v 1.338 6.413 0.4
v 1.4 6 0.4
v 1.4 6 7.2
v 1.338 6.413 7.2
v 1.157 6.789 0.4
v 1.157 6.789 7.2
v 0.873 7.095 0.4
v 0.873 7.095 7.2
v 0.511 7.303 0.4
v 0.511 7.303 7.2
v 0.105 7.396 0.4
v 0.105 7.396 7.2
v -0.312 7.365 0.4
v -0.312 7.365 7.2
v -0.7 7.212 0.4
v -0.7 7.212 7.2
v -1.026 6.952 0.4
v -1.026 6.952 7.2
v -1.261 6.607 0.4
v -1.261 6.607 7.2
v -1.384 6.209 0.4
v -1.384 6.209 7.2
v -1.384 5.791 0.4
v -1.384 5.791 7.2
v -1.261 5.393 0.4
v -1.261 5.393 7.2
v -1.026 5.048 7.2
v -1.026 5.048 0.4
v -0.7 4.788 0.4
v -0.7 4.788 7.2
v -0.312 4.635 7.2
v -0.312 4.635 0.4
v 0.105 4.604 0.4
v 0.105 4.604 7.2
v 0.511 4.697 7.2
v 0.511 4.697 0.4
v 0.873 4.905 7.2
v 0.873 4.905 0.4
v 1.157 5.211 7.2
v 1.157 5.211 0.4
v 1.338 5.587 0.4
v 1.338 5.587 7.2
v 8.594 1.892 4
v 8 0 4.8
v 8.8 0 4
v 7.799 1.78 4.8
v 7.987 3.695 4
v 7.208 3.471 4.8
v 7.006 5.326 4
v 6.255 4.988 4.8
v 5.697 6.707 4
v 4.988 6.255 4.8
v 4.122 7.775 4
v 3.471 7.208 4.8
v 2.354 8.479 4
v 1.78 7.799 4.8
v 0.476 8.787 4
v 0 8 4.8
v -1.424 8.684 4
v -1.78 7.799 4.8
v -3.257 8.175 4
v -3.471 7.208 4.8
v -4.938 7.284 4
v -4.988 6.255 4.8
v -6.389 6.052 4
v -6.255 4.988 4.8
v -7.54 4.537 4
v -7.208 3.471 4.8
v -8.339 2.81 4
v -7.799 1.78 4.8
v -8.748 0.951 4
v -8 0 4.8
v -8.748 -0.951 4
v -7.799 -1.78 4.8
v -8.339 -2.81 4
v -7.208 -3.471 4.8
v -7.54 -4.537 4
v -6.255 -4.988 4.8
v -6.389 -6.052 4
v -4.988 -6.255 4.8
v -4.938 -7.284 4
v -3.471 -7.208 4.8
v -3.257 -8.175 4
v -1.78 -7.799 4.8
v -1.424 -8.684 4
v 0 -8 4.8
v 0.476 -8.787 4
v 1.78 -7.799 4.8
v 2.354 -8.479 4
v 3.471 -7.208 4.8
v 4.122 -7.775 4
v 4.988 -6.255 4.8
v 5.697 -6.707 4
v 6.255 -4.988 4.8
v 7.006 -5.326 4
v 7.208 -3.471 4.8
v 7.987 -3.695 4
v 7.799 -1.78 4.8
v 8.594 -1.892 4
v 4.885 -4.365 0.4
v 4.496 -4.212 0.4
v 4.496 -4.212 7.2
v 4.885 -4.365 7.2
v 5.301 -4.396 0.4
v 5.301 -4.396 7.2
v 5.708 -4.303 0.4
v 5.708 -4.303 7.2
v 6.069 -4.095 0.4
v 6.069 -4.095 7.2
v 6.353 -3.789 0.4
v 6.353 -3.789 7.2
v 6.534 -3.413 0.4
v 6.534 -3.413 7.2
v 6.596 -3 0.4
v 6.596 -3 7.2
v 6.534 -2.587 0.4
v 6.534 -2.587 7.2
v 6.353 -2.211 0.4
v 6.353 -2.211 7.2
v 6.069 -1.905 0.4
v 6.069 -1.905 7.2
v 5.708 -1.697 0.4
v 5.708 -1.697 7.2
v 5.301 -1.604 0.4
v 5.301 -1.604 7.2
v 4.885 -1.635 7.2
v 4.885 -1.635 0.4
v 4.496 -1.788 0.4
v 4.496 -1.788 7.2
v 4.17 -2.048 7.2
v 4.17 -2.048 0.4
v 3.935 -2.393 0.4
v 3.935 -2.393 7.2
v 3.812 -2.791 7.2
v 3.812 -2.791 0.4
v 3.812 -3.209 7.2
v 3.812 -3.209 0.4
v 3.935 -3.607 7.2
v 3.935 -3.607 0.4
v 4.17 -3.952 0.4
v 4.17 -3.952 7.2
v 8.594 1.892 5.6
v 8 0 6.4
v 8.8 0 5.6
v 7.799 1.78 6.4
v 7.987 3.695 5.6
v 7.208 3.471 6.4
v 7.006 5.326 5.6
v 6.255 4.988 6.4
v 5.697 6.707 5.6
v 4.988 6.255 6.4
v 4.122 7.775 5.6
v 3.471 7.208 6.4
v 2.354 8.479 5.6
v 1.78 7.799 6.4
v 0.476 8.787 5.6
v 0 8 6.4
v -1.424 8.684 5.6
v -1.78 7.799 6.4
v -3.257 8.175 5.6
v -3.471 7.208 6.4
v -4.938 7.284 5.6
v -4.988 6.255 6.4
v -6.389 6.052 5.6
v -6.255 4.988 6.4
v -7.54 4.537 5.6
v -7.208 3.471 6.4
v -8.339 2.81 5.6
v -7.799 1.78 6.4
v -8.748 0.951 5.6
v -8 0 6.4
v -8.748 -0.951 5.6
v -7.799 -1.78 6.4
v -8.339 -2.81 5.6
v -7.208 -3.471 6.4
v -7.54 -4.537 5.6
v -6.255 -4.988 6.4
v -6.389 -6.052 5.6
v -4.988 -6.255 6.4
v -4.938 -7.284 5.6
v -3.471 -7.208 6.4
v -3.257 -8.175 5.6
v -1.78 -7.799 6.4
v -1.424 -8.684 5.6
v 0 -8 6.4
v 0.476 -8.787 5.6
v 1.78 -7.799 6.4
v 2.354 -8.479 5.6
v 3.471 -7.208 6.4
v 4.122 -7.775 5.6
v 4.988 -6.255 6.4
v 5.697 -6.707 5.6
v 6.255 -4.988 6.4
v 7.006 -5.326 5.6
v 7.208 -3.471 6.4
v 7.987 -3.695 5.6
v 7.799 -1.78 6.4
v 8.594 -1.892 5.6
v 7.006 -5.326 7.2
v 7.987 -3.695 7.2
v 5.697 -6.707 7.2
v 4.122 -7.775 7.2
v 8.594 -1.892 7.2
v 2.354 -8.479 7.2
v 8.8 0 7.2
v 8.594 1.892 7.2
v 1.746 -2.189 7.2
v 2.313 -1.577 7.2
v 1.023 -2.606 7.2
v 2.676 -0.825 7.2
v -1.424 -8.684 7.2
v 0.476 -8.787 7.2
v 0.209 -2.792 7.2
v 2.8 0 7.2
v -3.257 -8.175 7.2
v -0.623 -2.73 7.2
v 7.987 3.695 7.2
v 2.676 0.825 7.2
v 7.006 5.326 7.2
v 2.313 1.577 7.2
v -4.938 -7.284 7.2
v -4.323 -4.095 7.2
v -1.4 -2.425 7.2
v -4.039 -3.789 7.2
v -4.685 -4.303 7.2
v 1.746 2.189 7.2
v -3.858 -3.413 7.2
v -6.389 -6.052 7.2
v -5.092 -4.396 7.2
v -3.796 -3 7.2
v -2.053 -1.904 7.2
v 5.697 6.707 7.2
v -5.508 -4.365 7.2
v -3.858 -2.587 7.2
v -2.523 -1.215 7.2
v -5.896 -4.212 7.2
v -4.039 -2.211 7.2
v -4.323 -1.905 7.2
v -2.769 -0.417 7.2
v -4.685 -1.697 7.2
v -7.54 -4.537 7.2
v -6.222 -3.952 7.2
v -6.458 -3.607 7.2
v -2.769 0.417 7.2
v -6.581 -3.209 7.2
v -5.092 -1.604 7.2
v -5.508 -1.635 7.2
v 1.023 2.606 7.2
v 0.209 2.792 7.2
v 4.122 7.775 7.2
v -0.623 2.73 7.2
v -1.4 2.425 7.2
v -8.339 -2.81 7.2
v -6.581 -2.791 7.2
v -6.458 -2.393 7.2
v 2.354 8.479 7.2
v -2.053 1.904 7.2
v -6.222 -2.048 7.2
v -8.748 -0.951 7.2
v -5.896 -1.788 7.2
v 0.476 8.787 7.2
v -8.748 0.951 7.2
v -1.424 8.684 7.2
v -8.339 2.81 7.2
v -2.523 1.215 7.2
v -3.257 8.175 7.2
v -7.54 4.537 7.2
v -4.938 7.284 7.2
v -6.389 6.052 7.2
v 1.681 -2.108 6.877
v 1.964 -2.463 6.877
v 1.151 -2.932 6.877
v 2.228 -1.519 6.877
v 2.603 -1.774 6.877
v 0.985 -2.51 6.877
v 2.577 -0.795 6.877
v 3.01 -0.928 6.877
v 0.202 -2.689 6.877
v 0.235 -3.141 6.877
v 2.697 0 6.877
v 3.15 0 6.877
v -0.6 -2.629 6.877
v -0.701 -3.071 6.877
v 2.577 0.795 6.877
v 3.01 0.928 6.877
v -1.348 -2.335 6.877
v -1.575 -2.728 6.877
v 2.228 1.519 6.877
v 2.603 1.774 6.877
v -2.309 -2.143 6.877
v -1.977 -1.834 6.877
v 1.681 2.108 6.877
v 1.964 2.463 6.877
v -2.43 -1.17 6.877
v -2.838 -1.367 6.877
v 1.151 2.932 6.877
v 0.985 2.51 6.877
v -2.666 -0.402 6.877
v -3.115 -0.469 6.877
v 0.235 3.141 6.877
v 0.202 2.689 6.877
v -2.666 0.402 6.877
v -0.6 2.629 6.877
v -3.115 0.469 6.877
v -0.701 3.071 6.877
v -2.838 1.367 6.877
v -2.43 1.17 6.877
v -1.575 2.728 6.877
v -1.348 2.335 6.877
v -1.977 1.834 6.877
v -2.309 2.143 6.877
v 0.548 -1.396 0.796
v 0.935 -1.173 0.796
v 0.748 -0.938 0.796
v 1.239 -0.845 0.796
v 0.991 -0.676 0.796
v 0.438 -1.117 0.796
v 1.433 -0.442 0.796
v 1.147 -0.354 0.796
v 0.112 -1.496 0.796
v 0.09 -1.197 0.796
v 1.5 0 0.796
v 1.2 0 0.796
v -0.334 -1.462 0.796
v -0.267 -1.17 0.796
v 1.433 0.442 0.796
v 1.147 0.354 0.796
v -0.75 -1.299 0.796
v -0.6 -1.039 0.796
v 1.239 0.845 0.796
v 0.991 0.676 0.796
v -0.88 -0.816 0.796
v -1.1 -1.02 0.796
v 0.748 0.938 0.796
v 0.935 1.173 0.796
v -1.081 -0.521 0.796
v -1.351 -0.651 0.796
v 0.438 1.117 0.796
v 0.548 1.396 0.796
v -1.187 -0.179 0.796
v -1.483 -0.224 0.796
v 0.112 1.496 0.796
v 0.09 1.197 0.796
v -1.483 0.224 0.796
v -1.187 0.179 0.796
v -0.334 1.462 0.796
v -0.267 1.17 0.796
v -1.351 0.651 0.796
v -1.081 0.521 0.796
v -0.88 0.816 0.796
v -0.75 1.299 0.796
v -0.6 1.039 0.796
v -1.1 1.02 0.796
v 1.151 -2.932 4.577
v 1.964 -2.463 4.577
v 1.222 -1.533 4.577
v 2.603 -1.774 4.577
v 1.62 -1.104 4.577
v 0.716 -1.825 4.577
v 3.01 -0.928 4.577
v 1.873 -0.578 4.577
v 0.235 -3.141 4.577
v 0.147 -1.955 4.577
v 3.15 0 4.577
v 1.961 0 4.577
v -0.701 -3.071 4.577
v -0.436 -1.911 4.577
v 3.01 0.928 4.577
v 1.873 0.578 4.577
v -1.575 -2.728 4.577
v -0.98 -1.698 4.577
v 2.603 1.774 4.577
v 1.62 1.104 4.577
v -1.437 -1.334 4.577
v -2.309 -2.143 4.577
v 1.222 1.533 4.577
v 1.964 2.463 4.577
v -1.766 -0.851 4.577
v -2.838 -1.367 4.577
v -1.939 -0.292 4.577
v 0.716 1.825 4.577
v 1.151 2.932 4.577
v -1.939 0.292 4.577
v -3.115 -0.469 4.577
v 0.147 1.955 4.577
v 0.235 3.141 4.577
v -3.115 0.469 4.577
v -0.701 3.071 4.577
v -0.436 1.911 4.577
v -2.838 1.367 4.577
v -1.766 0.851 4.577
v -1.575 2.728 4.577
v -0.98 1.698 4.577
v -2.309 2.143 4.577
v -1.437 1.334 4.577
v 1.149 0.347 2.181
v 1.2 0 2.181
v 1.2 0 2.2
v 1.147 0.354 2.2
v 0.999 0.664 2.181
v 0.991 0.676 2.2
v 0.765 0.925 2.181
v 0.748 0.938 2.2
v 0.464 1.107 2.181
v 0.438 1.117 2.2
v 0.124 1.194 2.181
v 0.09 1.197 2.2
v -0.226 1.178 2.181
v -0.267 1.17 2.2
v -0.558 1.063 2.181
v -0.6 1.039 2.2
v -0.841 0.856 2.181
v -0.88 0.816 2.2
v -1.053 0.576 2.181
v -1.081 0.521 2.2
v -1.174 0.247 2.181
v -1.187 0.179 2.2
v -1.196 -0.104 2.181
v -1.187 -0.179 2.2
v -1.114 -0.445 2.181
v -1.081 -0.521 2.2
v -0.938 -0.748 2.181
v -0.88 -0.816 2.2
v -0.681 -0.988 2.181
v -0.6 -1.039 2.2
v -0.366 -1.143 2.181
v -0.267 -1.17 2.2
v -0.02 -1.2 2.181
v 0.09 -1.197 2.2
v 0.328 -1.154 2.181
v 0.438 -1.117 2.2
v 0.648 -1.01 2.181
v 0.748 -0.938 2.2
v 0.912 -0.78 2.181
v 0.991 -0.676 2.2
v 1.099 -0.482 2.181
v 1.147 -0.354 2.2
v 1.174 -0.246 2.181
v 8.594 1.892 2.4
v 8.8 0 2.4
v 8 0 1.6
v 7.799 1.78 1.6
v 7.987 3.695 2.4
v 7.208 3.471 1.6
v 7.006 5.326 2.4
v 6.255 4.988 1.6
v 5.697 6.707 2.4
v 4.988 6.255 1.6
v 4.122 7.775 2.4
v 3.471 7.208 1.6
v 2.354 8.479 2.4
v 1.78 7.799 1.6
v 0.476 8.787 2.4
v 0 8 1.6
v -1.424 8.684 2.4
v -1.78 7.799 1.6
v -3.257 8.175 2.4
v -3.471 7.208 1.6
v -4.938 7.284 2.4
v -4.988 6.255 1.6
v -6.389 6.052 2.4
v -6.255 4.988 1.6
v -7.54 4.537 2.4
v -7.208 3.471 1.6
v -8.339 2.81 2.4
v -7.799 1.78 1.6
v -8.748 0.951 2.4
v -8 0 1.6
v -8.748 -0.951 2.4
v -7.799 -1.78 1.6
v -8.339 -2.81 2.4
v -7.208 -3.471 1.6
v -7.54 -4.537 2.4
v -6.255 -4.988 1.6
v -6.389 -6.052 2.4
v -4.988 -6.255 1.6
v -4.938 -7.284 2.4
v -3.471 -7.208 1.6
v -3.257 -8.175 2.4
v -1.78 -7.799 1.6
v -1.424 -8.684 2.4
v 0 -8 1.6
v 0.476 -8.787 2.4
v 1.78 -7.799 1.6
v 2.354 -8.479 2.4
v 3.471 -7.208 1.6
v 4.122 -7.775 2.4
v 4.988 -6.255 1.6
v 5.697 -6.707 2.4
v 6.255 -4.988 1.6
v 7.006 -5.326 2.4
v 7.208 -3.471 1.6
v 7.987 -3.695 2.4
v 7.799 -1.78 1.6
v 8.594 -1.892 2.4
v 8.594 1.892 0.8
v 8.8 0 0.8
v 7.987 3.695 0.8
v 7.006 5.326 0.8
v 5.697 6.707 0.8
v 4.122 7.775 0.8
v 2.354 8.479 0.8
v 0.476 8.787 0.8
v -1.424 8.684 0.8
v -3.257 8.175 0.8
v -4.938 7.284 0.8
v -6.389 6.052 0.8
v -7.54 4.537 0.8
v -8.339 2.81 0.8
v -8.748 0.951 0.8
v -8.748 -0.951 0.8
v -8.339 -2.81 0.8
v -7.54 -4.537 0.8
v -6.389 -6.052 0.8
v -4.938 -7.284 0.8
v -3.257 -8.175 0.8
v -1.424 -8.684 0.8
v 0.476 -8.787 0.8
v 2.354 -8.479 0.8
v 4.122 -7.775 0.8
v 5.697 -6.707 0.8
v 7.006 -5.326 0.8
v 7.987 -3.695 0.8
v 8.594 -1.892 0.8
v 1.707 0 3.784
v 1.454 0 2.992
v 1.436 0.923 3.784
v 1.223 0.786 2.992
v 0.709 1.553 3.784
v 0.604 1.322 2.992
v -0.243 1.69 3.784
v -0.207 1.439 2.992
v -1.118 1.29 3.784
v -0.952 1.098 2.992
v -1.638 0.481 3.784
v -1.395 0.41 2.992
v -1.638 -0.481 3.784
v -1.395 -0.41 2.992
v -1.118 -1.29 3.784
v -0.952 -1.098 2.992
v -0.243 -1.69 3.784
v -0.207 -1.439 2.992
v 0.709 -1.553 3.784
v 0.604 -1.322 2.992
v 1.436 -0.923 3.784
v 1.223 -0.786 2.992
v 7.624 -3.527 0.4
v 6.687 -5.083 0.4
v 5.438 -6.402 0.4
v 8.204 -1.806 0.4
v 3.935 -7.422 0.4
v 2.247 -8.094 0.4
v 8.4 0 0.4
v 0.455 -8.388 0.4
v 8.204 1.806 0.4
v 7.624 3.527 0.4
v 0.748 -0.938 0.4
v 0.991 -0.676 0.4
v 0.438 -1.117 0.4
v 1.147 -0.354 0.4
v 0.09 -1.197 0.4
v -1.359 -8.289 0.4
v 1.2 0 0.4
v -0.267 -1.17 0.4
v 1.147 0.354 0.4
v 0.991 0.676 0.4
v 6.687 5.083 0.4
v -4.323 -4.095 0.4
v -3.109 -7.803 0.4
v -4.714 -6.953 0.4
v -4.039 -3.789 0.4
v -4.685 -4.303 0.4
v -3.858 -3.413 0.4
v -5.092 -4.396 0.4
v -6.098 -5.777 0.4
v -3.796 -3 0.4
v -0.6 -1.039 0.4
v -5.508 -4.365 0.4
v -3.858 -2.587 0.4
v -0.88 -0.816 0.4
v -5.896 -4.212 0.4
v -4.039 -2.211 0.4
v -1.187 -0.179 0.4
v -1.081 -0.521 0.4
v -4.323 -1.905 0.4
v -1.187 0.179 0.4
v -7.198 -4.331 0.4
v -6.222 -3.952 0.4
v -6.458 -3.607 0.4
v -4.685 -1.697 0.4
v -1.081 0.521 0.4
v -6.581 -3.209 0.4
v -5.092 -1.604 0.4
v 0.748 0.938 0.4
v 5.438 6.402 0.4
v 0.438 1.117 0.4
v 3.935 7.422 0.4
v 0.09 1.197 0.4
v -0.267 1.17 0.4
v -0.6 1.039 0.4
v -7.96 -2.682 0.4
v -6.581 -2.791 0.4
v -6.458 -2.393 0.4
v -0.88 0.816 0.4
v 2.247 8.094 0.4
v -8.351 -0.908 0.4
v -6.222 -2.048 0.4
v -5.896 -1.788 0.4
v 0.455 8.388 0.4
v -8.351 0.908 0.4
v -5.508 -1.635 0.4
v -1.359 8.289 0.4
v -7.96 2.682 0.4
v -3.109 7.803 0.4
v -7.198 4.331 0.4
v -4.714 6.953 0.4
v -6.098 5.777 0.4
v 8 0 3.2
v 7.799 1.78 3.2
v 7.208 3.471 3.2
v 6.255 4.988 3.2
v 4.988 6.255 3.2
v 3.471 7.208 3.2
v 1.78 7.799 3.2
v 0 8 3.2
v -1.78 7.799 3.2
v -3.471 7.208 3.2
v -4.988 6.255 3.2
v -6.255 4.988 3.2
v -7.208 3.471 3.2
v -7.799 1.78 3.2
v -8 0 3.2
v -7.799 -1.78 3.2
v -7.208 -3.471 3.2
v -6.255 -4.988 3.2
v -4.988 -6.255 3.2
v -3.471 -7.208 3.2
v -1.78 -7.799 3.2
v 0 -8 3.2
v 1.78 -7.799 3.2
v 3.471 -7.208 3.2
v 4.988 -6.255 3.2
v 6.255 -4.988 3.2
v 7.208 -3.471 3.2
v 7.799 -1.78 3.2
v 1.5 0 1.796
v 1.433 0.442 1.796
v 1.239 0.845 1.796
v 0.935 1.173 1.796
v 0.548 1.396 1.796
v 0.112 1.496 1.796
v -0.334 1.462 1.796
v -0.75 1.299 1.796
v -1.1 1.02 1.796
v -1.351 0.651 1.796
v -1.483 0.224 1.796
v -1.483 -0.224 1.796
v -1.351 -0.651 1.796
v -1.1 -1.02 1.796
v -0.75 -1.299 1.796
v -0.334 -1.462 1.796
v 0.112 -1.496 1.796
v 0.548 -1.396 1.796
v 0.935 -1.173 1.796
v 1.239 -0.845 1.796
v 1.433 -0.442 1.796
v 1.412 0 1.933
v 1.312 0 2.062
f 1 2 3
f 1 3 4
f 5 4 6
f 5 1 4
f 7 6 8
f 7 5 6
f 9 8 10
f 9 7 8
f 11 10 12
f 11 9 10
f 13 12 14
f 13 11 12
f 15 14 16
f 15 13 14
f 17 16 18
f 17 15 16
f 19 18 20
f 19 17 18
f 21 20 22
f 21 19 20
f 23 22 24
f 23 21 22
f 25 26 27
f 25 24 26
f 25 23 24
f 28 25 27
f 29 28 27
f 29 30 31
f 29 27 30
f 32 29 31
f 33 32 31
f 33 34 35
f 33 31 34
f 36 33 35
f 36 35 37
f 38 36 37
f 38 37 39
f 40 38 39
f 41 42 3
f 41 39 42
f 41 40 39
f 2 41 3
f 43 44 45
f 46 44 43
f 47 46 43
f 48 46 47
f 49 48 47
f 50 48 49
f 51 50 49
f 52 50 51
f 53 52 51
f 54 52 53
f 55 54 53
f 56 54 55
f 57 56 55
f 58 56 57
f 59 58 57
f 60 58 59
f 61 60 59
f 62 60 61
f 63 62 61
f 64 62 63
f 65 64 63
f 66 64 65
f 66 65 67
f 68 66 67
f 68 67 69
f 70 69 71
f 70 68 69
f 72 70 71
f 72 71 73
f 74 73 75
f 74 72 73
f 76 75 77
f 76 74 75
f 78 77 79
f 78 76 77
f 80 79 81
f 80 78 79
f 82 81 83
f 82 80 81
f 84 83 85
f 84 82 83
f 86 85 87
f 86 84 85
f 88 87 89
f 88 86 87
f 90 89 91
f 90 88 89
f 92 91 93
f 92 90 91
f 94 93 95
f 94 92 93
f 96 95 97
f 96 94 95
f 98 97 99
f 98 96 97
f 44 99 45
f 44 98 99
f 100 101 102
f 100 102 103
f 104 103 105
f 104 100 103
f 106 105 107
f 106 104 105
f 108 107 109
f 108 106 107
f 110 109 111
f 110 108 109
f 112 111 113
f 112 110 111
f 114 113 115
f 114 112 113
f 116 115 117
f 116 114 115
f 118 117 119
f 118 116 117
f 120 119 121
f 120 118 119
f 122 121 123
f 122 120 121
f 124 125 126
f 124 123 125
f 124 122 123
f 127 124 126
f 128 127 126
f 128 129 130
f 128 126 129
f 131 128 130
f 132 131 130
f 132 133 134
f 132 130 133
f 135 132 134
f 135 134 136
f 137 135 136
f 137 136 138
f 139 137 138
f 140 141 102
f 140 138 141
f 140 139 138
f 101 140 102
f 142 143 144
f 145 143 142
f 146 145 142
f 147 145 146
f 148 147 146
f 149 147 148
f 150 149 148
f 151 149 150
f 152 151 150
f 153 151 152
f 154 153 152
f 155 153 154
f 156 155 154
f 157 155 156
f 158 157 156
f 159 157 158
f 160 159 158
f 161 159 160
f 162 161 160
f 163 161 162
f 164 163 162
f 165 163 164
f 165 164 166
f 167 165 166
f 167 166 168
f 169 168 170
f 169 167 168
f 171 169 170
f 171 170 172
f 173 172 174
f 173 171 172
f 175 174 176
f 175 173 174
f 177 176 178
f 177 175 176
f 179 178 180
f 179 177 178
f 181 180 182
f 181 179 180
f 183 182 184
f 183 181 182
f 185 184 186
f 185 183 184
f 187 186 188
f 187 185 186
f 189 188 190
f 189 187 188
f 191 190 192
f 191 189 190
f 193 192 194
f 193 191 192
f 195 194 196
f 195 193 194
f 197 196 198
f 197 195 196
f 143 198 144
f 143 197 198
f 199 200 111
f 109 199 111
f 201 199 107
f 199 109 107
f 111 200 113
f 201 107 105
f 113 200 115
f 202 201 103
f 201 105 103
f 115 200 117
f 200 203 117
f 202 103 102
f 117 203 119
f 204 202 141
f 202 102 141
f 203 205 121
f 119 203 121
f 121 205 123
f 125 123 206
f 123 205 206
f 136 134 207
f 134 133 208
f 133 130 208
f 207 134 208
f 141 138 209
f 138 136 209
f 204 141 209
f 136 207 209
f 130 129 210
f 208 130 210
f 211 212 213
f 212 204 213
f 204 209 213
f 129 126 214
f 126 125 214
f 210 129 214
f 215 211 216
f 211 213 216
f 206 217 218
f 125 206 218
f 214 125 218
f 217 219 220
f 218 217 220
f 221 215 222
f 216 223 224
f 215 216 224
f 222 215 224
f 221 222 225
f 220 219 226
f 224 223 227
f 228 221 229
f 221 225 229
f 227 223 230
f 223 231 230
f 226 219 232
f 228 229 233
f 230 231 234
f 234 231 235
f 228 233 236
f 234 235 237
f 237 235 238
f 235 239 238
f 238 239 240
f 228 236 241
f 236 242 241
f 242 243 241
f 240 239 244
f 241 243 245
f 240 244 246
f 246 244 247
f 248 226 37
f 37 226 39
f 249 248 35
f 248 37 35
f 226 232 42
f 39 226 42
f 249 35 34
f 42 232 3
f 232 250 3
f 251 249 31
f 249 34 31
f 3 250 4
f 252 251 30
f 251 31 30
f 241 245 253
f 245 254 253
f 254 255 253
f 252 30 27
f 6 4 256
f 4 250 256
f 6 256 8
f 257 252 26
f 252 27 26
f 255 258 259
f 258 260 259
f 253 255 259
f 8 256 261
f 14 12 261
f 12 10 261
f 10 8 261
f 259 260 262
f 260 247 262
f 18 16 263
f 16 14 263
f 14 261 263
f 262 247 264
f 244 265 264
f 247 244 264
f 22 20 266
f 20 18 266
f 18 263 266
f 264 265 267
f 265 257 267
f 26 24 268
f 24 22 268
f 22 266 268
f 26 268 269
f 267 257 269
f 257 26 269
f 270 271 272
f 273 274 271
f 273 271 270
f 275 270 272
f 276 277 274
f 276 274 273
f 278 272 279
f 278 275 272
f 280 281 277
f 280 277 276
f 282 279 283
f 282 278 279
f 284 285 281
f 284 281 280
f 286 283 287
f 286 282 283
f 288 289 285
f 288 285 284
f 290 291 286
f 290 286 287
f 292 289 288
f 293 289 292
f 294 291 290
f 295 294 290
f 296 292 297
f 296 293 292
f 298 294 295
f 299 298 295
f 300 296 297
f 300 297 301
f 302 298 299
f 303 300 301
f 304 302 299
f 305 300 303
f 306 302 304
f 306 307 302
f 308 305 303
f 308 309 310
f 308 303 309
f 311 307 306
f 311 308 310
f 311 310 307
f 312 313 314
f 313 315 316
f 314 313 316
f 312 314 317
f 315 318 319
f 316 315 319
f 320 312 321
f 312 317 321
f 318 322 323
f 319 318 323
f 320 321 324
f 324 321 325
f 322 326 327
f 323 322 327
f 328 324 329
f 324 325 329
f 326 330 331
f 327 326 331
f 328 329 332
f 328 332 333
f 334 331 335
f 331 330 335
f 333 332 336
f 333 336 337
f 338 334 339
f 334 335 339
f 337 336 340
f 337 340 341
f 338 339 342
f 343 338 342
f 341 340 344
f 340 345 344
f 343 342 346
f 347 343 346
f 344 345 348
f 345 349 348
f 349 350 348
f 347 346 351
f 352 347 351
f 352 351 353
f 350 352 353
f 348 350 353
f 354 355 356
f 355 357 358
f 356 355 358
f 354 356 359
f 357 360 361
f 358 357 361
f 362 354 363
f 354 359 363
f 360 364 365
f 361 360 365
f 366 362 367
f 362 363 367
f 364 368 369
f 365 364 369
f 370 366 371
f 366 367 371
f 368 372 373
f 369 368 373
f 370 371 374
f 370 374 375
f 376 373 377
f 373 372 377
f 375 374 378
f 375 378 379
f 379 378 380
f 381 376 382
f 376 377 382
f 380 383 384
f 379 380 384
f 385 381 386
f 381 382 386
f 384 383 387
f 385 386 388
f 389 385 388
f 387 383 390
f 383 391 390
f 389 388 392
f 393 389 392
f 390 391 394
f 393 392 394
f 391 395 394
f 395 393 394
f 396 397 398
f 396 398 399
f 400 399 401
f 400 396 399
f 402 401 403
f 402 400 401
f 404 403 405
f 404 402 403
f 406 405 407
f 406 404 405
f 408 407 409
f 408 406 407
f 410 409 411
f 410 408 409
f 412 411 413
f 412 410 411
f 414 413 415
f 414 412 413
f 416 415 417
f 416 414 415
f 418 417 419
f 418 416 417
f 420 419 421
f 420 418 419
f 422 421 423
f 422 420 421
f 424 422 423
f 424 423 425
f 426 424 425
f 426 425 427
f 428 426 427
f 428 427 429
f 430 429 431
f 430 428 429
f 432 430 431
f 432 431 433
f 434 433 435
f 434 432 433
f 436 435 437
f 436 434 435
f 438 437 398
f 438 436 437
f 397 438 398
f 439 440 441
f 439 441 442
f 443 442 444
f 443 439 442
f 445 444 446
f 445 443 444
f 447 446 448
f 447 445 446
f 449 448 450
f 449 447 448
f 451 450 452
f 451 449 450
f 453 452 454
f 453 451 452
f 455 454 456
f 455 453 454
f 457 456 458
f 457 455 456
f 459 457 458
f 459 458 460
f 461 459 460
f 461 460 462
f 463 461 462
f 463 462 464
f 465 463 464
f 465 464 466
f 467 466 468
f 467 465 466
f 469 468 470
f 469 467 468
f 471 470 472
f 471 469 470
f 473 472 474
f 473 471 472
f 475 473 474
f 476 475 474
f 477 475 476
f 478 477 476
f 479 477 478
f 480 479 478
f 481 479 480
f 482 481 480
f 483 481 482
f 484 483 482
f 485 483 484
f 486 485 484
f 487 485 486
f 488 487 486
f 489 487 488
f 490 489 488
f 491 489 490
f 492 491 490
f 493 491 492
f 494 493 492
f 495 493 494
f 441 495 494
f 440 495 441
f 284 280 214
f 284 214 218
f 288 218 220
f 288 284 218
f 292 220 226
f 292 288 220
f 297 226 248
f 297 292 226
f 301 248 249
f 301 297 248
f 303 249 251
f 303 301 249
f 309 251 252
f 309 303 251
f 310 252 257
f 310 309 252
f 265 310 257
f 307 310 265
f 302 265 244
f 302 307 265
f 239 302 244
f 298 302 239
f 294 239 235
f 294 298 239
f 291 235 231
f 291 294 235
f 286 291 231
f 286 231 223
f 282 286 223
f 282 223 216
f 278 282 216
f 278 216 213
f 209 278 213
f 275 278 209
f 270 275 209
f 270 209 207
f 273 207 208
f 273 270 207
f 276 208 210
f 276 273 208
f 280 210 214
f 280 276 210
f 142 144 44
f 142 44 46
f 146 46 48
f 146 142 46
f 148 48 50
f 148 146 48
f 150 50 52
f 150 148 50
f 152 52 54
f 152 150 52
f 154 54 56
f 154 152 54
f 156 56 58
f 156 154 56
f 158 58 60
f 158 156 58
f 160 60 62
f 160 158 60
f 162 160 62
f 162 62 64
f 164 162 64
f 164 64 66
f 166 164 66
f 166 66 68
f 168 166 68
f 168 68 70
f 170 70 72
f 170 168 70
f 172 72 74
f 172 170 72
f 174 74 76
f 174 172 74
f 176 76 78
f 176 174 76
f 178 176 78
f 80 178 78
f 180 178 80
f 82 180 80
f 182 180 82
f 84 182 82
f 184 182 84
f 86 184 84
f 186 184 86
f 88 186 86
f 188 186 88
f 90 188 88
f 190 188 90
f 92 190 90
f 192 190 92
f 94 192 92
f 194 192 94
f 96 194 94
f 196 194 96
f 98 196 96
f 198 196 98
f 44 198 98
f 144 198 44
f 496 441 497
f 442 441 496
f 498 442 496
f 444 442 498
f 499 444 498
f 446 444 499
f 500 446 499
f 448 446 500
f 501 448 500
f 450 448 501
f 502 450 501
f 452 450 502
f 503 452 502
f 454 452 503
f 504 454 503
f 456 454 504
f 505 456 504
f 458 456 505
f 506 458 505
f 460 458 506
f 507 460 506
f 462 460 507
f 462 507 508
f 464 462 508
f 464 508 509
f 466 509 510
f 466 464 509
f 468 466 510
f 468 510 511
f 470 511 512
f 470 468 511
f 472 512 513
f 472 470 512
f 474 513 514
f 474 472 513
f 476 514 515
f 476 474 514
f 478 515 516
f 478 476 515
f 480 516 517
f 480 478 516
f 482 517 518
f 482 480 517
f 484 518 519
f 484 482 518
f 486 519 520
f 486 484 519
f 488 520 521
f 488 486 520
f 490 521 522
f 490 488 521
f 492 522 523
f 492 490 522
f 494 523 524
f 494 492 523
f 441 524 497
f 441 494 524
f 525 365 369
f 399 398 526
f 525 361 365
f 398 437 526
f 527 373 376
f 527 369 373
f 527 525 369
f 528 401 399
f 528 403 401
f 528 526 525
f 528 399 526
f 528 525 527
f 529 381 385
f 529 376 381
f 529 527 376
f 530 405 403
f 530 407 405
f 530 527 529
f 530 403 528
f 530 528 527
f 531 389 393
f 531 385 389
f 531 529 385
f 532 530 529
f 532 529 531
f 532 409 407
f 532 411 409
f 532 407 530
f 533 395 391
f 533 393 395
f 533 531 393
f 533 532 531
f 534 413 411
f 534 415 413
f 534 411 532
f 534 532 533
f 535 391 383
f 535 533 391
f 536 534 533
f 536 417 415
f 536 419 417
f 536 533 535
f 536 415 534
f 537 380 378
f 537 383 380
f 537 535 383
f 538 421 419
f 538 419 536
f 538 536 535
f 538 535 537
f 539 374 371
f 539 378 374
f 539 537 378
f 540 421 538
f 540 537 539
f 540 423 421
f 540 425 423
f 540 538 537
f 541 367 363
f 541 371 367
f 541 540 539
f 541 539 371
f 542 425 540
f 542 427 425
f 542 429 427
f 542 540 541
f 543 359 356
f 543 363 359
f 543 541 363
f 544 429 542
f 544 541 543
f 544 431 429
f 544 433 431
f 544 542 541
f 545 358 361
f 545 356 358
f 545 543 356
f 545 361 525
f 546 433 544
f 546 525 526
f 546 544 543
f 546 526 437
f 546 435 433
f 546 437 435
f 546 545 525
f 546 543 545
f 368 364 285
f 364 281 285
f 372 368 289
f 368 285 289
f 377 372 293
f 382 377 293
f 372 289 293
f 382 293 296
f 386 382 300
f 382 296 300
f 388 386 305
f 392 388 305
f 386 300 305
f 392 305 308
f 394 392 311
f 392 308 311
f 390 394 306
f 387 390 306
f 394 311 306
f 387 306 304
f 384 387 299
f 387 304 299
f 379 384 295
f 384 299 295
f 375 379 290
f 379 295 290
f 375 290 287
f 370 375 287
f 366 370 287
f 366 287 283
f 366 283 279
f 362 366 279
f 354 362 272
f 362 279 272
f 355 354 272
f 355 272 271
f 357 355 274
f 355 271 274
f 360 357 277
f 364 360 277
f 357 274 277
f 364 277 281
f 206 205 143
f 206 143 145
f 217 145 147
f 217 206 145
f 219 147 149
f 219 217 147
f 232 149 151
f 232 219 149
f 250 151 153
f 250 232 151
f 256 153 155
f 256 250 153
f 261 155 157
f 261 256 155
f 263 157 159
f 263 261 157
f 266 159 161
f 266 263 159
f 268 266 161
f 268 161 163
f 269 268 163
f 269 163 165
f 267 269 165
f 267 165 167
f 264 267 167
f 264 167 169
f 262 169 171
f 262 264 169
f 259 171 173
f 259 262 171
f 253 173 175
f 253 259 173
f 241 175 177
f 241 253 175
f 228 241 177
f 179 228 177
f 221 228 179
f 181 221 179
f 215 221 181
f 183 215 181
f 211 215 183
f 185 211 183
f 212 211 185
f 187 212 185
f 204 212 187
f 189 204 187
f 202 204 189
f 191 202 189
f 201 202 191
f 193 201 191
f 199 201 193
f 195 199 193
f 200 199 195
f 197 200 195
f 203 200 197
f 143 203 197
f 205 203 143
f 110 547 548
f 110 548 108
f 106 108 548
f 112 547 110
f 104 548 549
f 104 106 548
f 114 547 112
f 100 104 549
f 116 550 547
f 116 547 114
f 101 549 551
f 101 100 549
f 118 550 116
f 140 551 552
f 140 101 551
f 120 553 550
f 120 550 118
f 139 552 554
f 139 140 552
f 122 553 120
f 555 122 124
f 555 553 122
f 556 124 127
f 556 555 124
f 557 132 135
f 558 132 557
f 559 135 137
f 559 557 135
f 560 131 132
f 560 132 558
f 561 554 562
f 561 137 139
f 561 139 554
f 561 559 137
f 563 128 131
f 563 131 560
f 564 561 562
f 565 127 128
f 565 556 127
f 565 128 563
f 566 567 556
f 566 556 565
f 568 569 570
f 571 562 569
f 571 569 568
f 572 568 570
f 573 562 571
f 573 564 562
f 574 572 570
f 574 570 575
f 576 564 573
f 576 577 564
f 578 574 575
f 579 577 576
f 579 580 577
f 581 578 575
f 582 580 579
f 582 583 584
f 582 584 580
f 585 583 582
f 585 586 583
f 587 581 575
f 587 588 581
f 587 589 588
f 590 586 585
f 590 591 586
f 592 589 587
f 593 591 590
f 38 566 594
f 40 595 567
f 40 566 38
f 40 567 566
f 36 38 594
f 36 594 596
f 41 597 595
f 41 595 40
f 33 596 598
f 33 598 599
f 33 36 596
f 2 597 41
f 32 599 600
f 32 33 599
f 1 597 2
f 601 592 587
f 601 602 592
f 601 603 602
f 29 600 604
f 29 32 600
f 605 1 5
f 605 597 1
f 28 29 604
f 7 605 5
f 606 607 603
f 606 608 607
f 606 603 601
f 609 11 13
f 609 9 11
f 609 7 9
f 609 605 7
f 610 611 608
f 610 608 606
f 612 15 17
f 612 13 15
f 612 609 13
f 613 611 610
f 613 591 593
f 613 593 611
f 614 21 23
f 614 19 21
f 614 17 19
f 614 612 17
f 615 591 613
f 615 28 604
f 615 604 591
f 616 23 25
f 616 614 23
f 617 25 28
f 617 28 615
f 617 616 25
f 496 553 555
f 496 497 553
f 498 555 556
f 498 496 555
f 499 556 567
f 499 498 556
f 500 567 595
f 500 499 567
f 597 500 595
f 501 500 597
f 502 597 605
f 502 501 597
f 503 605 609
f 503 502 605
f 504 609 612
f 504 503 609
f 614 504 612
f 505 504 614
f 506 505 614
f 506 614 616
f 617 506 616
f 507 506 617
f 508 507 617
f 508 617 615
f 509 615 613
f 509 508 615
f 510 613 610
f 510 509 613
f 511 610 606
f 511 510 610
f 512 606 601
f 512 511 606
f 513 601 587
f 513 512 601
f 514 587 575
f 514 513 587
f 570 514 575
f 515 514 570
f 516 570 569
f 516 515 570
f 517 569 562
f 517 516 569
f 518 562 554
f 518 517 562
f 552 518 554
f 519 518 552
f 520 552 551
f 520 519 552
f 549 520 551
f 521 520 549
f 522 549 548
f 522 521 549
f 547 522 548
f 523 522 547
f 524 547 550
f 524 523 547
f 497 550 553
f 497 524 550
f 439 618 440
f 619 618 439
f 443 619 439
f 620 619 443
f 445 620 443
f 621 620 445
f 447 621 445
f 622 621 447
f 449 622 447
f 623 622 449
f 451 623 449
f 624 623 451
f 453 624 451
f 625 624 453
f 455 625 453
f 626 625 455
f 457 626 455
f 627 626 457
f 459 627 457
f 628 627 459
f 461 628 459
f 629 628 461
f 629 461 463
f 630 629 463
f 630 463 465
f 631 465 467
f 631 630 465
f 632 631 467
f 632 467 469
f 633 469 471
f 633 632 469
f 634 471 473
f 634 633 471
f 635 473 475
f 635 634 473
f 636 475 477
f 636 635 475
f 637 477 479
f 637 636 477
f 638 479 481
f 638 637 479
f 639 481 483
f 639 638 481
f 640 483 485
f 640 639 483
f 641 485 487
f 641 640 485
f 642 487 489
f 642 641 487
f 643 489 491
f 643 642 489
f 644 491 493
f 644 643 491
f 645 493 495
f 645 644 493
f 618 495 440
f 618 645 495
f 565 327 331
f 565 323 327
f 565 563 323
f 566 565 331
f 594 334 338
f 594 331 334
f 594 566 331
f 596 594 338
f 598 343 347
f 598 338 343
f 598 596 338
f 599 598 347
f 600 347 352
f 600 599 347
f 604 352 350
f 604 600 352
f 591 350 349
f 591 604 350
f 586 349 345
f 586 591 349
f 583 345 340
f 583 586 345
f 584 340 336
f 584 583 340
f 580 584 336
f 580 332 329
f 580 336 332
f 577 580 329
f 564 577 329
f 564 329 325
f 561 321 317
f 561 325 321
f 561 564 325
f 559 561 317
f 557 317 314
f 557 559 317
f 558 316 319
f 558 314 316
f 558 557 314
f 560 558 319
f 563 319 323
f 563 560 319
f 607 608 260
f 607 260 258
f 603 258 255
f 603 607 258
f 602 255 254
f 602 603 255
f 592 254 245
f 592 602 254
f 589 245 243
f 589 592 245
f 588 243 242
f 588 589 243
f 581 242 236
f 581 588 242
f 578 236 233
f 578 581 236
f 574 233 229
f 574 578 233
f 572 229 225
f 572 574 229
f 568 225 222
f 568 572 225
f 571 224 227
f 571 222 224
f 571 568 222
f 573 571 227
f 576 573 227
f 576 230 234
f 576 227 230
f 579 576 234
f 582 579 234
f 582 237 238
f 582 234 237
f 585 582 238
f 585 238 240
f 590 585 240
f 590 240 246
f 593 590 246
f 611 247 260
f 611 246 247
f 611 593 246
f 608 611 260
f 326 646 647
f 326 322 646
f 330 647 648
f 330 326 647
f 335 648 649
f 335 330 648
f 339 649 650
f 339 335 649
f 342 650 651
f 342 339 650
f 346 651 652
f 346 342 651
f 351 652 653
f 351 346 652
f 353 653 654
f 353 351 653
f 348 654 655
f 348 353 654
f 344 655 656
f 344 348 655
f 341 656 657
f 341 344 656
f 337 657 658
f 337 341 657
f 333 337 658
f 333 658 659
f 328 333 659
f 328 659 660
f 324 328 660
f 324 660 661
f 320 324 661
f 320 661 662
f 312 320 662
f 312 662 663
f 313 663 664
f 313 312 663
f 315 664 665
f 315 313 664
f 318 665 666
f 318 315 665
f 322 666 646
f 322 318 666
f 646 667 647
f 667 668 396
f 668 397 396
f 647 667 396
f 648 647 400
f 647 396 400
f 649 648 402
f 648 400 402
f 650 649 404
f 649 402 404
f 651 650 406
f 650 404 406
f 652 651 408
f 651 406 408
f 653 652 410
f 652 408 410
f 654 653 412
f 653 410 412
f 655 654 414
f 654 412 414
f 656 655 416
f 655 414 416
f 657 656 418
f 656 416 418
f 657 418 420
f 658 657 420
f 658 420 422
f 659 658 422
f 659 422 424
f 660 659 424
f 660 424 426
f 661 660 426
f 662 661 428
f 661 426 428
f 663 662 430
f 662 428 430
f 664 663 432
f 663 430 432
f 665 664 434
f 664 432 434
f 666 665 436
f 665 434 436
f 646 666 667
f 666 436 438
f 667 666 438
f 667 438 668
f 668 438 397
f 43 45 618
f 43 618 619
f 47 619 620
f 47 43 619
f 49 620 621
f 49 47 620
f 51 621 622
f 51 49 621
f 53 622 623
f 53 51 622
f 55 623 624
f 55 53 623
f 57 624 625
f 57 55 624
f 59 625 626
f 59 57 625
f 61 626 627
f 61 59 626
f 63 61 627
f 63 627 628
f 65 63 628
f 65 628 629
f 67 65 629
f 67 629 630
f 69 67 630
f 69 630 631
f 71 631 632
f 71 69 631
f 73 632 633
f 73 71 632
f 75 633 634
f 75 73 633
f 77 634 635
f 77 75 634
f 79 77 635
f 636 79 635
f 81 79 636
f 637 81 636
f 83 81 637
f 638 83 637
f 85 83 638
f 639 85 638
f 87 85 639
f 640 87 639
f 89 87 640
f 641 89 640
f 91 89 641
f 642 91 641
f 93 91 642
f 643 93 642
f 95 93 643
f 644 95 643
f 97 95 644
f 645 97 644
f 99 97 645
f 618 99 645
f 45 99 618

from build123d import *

# Parameters (mm, degrees)
CYLINDER_R     = 1.4
CYLINDER_DEPTH = 10
ARRAY001_COUNT = 3
SKETCH018_W    = 3.15
SKETCH018_H    = 2.3
SKETCH002_W    = 5
SKETCH002_H    = 6.8
ARRAY_Z_COUNT  = 6
ARRAY_Z_PITCH  = 1.6


with BuildPart() as boltholes:
    # Cylinder → Cylinder (new body)
    with BuildSketch(Plane(origin=(0, 6, -1), x_dir=(1, 0, 0), z_dir=(0, 0, 1))):
        Circle(CYLINDER_R)
    extrude(amount=CYLINDER_DEPTH)

    # Array001: BoltHoles ×3 about axis
    array001_axis = Axis((0, 0, 0), (0, 0, 1))


with BuildPart() as boltholes_1:
    add(boltholes.part)
    for i in range(1, ARRAY001_COUNT):
        add(boltholes.part.rotate(array001_axis, i * 360 / ARRAY001_COUNT))


with BuildPart() as ps2long001:
    # Sketch018 → Revolution007 (revolve)
    with BuildSketch(Plane.XZ):
        with Locations((1.575, 5.7267413876)):
            Rectangle(SKETCH018_W, SKETCH018_H)
    revolve(axis=Axis((0, 0, 0), (0, 0, 1)))


with BuildPart() as clone_of_laq:
    # Sketch007 → Revolution006 (revolve)
    with BuildSketch(Plane.XZ):
        with BuildLine():
            ThreePointArc((1.5, 1.7955317108), (0.867020761, 2.4322916436), (0, 2.6655317108))
            Line((0, 2.6655317108), (0, 0.7955317108))
            Line((0, 0.7955317108), (1.5, 0.7955317108))
            Line((1.5, 1.7955317108), (1.5, 0.7955317108))
        make_face()
    revolve(axis=Axis((0, 0, 0), (0, 0, 1)))


with BuildPart() as innergroovedom001:
    # Sketch002 → Revolution002 (revolve)
    with BuildSketch(Plane.XZ):
        with Locations((7.5, 3.8)):
            Rectangle(SKETCH002_W, SKETCH002_H)
    revolve(axis=Axis((0, 0, 0), (0, 0, 1)))


with BuildPart() as innergroovetool:
    # Sketch001 → Revolution001 (revolve)
    with BuildSketch(Plane.XZ):
        Polygon((4, 8), (4, 6.4), (8, 6.4), (8.8, 7.2), (8, 8), align=None)
    revolve(axis=Axis((0, 0, 0), (0, 0, 1)))

    # Array Z: InnerGrooveTool ×6


with BuildPart() as innergroovetool_1:
    add(innergroovetool.part)
    with Locations(*[(0, 0, -i * ARRAY_Z_PITCH) for i in range(1, ARRAY_Z_COUNT)]):
        add(innergroovetool.part)

    # Common: intersect InnerGrooveDom001
    add(innergroovedom001.part, mode=Mode.INTERSECT)


with BuildPart() as boltholes001:
    # Sketch → Revolution (revolve)
    with BuildSketch(Plane.XZ):
        Polygon((1.2, 0.4), (8, 0.4), (8, 7.2), (2.8, 7.2), (1.2, 2.2), align=None)
    revolve(axis=Axis((0, 0, 0), (0, 0, 1)))

    # Fusion001: union InnerGrooveTool
    add(innergroovetool_1.part)

    # Cut: cut Clone of LAQ
    add(clone_of_laq.part, mode=Mode.SUBTRACT)

    # Cut003: cut PS2Long001
    add(ps2long001.part, mode=Mode.SUBTRACT)

    # Cut001: cut BoltHoles
    add(boltholes_1.part, mode=Mode.SUBTRACT)


solid = boltholes001.part
